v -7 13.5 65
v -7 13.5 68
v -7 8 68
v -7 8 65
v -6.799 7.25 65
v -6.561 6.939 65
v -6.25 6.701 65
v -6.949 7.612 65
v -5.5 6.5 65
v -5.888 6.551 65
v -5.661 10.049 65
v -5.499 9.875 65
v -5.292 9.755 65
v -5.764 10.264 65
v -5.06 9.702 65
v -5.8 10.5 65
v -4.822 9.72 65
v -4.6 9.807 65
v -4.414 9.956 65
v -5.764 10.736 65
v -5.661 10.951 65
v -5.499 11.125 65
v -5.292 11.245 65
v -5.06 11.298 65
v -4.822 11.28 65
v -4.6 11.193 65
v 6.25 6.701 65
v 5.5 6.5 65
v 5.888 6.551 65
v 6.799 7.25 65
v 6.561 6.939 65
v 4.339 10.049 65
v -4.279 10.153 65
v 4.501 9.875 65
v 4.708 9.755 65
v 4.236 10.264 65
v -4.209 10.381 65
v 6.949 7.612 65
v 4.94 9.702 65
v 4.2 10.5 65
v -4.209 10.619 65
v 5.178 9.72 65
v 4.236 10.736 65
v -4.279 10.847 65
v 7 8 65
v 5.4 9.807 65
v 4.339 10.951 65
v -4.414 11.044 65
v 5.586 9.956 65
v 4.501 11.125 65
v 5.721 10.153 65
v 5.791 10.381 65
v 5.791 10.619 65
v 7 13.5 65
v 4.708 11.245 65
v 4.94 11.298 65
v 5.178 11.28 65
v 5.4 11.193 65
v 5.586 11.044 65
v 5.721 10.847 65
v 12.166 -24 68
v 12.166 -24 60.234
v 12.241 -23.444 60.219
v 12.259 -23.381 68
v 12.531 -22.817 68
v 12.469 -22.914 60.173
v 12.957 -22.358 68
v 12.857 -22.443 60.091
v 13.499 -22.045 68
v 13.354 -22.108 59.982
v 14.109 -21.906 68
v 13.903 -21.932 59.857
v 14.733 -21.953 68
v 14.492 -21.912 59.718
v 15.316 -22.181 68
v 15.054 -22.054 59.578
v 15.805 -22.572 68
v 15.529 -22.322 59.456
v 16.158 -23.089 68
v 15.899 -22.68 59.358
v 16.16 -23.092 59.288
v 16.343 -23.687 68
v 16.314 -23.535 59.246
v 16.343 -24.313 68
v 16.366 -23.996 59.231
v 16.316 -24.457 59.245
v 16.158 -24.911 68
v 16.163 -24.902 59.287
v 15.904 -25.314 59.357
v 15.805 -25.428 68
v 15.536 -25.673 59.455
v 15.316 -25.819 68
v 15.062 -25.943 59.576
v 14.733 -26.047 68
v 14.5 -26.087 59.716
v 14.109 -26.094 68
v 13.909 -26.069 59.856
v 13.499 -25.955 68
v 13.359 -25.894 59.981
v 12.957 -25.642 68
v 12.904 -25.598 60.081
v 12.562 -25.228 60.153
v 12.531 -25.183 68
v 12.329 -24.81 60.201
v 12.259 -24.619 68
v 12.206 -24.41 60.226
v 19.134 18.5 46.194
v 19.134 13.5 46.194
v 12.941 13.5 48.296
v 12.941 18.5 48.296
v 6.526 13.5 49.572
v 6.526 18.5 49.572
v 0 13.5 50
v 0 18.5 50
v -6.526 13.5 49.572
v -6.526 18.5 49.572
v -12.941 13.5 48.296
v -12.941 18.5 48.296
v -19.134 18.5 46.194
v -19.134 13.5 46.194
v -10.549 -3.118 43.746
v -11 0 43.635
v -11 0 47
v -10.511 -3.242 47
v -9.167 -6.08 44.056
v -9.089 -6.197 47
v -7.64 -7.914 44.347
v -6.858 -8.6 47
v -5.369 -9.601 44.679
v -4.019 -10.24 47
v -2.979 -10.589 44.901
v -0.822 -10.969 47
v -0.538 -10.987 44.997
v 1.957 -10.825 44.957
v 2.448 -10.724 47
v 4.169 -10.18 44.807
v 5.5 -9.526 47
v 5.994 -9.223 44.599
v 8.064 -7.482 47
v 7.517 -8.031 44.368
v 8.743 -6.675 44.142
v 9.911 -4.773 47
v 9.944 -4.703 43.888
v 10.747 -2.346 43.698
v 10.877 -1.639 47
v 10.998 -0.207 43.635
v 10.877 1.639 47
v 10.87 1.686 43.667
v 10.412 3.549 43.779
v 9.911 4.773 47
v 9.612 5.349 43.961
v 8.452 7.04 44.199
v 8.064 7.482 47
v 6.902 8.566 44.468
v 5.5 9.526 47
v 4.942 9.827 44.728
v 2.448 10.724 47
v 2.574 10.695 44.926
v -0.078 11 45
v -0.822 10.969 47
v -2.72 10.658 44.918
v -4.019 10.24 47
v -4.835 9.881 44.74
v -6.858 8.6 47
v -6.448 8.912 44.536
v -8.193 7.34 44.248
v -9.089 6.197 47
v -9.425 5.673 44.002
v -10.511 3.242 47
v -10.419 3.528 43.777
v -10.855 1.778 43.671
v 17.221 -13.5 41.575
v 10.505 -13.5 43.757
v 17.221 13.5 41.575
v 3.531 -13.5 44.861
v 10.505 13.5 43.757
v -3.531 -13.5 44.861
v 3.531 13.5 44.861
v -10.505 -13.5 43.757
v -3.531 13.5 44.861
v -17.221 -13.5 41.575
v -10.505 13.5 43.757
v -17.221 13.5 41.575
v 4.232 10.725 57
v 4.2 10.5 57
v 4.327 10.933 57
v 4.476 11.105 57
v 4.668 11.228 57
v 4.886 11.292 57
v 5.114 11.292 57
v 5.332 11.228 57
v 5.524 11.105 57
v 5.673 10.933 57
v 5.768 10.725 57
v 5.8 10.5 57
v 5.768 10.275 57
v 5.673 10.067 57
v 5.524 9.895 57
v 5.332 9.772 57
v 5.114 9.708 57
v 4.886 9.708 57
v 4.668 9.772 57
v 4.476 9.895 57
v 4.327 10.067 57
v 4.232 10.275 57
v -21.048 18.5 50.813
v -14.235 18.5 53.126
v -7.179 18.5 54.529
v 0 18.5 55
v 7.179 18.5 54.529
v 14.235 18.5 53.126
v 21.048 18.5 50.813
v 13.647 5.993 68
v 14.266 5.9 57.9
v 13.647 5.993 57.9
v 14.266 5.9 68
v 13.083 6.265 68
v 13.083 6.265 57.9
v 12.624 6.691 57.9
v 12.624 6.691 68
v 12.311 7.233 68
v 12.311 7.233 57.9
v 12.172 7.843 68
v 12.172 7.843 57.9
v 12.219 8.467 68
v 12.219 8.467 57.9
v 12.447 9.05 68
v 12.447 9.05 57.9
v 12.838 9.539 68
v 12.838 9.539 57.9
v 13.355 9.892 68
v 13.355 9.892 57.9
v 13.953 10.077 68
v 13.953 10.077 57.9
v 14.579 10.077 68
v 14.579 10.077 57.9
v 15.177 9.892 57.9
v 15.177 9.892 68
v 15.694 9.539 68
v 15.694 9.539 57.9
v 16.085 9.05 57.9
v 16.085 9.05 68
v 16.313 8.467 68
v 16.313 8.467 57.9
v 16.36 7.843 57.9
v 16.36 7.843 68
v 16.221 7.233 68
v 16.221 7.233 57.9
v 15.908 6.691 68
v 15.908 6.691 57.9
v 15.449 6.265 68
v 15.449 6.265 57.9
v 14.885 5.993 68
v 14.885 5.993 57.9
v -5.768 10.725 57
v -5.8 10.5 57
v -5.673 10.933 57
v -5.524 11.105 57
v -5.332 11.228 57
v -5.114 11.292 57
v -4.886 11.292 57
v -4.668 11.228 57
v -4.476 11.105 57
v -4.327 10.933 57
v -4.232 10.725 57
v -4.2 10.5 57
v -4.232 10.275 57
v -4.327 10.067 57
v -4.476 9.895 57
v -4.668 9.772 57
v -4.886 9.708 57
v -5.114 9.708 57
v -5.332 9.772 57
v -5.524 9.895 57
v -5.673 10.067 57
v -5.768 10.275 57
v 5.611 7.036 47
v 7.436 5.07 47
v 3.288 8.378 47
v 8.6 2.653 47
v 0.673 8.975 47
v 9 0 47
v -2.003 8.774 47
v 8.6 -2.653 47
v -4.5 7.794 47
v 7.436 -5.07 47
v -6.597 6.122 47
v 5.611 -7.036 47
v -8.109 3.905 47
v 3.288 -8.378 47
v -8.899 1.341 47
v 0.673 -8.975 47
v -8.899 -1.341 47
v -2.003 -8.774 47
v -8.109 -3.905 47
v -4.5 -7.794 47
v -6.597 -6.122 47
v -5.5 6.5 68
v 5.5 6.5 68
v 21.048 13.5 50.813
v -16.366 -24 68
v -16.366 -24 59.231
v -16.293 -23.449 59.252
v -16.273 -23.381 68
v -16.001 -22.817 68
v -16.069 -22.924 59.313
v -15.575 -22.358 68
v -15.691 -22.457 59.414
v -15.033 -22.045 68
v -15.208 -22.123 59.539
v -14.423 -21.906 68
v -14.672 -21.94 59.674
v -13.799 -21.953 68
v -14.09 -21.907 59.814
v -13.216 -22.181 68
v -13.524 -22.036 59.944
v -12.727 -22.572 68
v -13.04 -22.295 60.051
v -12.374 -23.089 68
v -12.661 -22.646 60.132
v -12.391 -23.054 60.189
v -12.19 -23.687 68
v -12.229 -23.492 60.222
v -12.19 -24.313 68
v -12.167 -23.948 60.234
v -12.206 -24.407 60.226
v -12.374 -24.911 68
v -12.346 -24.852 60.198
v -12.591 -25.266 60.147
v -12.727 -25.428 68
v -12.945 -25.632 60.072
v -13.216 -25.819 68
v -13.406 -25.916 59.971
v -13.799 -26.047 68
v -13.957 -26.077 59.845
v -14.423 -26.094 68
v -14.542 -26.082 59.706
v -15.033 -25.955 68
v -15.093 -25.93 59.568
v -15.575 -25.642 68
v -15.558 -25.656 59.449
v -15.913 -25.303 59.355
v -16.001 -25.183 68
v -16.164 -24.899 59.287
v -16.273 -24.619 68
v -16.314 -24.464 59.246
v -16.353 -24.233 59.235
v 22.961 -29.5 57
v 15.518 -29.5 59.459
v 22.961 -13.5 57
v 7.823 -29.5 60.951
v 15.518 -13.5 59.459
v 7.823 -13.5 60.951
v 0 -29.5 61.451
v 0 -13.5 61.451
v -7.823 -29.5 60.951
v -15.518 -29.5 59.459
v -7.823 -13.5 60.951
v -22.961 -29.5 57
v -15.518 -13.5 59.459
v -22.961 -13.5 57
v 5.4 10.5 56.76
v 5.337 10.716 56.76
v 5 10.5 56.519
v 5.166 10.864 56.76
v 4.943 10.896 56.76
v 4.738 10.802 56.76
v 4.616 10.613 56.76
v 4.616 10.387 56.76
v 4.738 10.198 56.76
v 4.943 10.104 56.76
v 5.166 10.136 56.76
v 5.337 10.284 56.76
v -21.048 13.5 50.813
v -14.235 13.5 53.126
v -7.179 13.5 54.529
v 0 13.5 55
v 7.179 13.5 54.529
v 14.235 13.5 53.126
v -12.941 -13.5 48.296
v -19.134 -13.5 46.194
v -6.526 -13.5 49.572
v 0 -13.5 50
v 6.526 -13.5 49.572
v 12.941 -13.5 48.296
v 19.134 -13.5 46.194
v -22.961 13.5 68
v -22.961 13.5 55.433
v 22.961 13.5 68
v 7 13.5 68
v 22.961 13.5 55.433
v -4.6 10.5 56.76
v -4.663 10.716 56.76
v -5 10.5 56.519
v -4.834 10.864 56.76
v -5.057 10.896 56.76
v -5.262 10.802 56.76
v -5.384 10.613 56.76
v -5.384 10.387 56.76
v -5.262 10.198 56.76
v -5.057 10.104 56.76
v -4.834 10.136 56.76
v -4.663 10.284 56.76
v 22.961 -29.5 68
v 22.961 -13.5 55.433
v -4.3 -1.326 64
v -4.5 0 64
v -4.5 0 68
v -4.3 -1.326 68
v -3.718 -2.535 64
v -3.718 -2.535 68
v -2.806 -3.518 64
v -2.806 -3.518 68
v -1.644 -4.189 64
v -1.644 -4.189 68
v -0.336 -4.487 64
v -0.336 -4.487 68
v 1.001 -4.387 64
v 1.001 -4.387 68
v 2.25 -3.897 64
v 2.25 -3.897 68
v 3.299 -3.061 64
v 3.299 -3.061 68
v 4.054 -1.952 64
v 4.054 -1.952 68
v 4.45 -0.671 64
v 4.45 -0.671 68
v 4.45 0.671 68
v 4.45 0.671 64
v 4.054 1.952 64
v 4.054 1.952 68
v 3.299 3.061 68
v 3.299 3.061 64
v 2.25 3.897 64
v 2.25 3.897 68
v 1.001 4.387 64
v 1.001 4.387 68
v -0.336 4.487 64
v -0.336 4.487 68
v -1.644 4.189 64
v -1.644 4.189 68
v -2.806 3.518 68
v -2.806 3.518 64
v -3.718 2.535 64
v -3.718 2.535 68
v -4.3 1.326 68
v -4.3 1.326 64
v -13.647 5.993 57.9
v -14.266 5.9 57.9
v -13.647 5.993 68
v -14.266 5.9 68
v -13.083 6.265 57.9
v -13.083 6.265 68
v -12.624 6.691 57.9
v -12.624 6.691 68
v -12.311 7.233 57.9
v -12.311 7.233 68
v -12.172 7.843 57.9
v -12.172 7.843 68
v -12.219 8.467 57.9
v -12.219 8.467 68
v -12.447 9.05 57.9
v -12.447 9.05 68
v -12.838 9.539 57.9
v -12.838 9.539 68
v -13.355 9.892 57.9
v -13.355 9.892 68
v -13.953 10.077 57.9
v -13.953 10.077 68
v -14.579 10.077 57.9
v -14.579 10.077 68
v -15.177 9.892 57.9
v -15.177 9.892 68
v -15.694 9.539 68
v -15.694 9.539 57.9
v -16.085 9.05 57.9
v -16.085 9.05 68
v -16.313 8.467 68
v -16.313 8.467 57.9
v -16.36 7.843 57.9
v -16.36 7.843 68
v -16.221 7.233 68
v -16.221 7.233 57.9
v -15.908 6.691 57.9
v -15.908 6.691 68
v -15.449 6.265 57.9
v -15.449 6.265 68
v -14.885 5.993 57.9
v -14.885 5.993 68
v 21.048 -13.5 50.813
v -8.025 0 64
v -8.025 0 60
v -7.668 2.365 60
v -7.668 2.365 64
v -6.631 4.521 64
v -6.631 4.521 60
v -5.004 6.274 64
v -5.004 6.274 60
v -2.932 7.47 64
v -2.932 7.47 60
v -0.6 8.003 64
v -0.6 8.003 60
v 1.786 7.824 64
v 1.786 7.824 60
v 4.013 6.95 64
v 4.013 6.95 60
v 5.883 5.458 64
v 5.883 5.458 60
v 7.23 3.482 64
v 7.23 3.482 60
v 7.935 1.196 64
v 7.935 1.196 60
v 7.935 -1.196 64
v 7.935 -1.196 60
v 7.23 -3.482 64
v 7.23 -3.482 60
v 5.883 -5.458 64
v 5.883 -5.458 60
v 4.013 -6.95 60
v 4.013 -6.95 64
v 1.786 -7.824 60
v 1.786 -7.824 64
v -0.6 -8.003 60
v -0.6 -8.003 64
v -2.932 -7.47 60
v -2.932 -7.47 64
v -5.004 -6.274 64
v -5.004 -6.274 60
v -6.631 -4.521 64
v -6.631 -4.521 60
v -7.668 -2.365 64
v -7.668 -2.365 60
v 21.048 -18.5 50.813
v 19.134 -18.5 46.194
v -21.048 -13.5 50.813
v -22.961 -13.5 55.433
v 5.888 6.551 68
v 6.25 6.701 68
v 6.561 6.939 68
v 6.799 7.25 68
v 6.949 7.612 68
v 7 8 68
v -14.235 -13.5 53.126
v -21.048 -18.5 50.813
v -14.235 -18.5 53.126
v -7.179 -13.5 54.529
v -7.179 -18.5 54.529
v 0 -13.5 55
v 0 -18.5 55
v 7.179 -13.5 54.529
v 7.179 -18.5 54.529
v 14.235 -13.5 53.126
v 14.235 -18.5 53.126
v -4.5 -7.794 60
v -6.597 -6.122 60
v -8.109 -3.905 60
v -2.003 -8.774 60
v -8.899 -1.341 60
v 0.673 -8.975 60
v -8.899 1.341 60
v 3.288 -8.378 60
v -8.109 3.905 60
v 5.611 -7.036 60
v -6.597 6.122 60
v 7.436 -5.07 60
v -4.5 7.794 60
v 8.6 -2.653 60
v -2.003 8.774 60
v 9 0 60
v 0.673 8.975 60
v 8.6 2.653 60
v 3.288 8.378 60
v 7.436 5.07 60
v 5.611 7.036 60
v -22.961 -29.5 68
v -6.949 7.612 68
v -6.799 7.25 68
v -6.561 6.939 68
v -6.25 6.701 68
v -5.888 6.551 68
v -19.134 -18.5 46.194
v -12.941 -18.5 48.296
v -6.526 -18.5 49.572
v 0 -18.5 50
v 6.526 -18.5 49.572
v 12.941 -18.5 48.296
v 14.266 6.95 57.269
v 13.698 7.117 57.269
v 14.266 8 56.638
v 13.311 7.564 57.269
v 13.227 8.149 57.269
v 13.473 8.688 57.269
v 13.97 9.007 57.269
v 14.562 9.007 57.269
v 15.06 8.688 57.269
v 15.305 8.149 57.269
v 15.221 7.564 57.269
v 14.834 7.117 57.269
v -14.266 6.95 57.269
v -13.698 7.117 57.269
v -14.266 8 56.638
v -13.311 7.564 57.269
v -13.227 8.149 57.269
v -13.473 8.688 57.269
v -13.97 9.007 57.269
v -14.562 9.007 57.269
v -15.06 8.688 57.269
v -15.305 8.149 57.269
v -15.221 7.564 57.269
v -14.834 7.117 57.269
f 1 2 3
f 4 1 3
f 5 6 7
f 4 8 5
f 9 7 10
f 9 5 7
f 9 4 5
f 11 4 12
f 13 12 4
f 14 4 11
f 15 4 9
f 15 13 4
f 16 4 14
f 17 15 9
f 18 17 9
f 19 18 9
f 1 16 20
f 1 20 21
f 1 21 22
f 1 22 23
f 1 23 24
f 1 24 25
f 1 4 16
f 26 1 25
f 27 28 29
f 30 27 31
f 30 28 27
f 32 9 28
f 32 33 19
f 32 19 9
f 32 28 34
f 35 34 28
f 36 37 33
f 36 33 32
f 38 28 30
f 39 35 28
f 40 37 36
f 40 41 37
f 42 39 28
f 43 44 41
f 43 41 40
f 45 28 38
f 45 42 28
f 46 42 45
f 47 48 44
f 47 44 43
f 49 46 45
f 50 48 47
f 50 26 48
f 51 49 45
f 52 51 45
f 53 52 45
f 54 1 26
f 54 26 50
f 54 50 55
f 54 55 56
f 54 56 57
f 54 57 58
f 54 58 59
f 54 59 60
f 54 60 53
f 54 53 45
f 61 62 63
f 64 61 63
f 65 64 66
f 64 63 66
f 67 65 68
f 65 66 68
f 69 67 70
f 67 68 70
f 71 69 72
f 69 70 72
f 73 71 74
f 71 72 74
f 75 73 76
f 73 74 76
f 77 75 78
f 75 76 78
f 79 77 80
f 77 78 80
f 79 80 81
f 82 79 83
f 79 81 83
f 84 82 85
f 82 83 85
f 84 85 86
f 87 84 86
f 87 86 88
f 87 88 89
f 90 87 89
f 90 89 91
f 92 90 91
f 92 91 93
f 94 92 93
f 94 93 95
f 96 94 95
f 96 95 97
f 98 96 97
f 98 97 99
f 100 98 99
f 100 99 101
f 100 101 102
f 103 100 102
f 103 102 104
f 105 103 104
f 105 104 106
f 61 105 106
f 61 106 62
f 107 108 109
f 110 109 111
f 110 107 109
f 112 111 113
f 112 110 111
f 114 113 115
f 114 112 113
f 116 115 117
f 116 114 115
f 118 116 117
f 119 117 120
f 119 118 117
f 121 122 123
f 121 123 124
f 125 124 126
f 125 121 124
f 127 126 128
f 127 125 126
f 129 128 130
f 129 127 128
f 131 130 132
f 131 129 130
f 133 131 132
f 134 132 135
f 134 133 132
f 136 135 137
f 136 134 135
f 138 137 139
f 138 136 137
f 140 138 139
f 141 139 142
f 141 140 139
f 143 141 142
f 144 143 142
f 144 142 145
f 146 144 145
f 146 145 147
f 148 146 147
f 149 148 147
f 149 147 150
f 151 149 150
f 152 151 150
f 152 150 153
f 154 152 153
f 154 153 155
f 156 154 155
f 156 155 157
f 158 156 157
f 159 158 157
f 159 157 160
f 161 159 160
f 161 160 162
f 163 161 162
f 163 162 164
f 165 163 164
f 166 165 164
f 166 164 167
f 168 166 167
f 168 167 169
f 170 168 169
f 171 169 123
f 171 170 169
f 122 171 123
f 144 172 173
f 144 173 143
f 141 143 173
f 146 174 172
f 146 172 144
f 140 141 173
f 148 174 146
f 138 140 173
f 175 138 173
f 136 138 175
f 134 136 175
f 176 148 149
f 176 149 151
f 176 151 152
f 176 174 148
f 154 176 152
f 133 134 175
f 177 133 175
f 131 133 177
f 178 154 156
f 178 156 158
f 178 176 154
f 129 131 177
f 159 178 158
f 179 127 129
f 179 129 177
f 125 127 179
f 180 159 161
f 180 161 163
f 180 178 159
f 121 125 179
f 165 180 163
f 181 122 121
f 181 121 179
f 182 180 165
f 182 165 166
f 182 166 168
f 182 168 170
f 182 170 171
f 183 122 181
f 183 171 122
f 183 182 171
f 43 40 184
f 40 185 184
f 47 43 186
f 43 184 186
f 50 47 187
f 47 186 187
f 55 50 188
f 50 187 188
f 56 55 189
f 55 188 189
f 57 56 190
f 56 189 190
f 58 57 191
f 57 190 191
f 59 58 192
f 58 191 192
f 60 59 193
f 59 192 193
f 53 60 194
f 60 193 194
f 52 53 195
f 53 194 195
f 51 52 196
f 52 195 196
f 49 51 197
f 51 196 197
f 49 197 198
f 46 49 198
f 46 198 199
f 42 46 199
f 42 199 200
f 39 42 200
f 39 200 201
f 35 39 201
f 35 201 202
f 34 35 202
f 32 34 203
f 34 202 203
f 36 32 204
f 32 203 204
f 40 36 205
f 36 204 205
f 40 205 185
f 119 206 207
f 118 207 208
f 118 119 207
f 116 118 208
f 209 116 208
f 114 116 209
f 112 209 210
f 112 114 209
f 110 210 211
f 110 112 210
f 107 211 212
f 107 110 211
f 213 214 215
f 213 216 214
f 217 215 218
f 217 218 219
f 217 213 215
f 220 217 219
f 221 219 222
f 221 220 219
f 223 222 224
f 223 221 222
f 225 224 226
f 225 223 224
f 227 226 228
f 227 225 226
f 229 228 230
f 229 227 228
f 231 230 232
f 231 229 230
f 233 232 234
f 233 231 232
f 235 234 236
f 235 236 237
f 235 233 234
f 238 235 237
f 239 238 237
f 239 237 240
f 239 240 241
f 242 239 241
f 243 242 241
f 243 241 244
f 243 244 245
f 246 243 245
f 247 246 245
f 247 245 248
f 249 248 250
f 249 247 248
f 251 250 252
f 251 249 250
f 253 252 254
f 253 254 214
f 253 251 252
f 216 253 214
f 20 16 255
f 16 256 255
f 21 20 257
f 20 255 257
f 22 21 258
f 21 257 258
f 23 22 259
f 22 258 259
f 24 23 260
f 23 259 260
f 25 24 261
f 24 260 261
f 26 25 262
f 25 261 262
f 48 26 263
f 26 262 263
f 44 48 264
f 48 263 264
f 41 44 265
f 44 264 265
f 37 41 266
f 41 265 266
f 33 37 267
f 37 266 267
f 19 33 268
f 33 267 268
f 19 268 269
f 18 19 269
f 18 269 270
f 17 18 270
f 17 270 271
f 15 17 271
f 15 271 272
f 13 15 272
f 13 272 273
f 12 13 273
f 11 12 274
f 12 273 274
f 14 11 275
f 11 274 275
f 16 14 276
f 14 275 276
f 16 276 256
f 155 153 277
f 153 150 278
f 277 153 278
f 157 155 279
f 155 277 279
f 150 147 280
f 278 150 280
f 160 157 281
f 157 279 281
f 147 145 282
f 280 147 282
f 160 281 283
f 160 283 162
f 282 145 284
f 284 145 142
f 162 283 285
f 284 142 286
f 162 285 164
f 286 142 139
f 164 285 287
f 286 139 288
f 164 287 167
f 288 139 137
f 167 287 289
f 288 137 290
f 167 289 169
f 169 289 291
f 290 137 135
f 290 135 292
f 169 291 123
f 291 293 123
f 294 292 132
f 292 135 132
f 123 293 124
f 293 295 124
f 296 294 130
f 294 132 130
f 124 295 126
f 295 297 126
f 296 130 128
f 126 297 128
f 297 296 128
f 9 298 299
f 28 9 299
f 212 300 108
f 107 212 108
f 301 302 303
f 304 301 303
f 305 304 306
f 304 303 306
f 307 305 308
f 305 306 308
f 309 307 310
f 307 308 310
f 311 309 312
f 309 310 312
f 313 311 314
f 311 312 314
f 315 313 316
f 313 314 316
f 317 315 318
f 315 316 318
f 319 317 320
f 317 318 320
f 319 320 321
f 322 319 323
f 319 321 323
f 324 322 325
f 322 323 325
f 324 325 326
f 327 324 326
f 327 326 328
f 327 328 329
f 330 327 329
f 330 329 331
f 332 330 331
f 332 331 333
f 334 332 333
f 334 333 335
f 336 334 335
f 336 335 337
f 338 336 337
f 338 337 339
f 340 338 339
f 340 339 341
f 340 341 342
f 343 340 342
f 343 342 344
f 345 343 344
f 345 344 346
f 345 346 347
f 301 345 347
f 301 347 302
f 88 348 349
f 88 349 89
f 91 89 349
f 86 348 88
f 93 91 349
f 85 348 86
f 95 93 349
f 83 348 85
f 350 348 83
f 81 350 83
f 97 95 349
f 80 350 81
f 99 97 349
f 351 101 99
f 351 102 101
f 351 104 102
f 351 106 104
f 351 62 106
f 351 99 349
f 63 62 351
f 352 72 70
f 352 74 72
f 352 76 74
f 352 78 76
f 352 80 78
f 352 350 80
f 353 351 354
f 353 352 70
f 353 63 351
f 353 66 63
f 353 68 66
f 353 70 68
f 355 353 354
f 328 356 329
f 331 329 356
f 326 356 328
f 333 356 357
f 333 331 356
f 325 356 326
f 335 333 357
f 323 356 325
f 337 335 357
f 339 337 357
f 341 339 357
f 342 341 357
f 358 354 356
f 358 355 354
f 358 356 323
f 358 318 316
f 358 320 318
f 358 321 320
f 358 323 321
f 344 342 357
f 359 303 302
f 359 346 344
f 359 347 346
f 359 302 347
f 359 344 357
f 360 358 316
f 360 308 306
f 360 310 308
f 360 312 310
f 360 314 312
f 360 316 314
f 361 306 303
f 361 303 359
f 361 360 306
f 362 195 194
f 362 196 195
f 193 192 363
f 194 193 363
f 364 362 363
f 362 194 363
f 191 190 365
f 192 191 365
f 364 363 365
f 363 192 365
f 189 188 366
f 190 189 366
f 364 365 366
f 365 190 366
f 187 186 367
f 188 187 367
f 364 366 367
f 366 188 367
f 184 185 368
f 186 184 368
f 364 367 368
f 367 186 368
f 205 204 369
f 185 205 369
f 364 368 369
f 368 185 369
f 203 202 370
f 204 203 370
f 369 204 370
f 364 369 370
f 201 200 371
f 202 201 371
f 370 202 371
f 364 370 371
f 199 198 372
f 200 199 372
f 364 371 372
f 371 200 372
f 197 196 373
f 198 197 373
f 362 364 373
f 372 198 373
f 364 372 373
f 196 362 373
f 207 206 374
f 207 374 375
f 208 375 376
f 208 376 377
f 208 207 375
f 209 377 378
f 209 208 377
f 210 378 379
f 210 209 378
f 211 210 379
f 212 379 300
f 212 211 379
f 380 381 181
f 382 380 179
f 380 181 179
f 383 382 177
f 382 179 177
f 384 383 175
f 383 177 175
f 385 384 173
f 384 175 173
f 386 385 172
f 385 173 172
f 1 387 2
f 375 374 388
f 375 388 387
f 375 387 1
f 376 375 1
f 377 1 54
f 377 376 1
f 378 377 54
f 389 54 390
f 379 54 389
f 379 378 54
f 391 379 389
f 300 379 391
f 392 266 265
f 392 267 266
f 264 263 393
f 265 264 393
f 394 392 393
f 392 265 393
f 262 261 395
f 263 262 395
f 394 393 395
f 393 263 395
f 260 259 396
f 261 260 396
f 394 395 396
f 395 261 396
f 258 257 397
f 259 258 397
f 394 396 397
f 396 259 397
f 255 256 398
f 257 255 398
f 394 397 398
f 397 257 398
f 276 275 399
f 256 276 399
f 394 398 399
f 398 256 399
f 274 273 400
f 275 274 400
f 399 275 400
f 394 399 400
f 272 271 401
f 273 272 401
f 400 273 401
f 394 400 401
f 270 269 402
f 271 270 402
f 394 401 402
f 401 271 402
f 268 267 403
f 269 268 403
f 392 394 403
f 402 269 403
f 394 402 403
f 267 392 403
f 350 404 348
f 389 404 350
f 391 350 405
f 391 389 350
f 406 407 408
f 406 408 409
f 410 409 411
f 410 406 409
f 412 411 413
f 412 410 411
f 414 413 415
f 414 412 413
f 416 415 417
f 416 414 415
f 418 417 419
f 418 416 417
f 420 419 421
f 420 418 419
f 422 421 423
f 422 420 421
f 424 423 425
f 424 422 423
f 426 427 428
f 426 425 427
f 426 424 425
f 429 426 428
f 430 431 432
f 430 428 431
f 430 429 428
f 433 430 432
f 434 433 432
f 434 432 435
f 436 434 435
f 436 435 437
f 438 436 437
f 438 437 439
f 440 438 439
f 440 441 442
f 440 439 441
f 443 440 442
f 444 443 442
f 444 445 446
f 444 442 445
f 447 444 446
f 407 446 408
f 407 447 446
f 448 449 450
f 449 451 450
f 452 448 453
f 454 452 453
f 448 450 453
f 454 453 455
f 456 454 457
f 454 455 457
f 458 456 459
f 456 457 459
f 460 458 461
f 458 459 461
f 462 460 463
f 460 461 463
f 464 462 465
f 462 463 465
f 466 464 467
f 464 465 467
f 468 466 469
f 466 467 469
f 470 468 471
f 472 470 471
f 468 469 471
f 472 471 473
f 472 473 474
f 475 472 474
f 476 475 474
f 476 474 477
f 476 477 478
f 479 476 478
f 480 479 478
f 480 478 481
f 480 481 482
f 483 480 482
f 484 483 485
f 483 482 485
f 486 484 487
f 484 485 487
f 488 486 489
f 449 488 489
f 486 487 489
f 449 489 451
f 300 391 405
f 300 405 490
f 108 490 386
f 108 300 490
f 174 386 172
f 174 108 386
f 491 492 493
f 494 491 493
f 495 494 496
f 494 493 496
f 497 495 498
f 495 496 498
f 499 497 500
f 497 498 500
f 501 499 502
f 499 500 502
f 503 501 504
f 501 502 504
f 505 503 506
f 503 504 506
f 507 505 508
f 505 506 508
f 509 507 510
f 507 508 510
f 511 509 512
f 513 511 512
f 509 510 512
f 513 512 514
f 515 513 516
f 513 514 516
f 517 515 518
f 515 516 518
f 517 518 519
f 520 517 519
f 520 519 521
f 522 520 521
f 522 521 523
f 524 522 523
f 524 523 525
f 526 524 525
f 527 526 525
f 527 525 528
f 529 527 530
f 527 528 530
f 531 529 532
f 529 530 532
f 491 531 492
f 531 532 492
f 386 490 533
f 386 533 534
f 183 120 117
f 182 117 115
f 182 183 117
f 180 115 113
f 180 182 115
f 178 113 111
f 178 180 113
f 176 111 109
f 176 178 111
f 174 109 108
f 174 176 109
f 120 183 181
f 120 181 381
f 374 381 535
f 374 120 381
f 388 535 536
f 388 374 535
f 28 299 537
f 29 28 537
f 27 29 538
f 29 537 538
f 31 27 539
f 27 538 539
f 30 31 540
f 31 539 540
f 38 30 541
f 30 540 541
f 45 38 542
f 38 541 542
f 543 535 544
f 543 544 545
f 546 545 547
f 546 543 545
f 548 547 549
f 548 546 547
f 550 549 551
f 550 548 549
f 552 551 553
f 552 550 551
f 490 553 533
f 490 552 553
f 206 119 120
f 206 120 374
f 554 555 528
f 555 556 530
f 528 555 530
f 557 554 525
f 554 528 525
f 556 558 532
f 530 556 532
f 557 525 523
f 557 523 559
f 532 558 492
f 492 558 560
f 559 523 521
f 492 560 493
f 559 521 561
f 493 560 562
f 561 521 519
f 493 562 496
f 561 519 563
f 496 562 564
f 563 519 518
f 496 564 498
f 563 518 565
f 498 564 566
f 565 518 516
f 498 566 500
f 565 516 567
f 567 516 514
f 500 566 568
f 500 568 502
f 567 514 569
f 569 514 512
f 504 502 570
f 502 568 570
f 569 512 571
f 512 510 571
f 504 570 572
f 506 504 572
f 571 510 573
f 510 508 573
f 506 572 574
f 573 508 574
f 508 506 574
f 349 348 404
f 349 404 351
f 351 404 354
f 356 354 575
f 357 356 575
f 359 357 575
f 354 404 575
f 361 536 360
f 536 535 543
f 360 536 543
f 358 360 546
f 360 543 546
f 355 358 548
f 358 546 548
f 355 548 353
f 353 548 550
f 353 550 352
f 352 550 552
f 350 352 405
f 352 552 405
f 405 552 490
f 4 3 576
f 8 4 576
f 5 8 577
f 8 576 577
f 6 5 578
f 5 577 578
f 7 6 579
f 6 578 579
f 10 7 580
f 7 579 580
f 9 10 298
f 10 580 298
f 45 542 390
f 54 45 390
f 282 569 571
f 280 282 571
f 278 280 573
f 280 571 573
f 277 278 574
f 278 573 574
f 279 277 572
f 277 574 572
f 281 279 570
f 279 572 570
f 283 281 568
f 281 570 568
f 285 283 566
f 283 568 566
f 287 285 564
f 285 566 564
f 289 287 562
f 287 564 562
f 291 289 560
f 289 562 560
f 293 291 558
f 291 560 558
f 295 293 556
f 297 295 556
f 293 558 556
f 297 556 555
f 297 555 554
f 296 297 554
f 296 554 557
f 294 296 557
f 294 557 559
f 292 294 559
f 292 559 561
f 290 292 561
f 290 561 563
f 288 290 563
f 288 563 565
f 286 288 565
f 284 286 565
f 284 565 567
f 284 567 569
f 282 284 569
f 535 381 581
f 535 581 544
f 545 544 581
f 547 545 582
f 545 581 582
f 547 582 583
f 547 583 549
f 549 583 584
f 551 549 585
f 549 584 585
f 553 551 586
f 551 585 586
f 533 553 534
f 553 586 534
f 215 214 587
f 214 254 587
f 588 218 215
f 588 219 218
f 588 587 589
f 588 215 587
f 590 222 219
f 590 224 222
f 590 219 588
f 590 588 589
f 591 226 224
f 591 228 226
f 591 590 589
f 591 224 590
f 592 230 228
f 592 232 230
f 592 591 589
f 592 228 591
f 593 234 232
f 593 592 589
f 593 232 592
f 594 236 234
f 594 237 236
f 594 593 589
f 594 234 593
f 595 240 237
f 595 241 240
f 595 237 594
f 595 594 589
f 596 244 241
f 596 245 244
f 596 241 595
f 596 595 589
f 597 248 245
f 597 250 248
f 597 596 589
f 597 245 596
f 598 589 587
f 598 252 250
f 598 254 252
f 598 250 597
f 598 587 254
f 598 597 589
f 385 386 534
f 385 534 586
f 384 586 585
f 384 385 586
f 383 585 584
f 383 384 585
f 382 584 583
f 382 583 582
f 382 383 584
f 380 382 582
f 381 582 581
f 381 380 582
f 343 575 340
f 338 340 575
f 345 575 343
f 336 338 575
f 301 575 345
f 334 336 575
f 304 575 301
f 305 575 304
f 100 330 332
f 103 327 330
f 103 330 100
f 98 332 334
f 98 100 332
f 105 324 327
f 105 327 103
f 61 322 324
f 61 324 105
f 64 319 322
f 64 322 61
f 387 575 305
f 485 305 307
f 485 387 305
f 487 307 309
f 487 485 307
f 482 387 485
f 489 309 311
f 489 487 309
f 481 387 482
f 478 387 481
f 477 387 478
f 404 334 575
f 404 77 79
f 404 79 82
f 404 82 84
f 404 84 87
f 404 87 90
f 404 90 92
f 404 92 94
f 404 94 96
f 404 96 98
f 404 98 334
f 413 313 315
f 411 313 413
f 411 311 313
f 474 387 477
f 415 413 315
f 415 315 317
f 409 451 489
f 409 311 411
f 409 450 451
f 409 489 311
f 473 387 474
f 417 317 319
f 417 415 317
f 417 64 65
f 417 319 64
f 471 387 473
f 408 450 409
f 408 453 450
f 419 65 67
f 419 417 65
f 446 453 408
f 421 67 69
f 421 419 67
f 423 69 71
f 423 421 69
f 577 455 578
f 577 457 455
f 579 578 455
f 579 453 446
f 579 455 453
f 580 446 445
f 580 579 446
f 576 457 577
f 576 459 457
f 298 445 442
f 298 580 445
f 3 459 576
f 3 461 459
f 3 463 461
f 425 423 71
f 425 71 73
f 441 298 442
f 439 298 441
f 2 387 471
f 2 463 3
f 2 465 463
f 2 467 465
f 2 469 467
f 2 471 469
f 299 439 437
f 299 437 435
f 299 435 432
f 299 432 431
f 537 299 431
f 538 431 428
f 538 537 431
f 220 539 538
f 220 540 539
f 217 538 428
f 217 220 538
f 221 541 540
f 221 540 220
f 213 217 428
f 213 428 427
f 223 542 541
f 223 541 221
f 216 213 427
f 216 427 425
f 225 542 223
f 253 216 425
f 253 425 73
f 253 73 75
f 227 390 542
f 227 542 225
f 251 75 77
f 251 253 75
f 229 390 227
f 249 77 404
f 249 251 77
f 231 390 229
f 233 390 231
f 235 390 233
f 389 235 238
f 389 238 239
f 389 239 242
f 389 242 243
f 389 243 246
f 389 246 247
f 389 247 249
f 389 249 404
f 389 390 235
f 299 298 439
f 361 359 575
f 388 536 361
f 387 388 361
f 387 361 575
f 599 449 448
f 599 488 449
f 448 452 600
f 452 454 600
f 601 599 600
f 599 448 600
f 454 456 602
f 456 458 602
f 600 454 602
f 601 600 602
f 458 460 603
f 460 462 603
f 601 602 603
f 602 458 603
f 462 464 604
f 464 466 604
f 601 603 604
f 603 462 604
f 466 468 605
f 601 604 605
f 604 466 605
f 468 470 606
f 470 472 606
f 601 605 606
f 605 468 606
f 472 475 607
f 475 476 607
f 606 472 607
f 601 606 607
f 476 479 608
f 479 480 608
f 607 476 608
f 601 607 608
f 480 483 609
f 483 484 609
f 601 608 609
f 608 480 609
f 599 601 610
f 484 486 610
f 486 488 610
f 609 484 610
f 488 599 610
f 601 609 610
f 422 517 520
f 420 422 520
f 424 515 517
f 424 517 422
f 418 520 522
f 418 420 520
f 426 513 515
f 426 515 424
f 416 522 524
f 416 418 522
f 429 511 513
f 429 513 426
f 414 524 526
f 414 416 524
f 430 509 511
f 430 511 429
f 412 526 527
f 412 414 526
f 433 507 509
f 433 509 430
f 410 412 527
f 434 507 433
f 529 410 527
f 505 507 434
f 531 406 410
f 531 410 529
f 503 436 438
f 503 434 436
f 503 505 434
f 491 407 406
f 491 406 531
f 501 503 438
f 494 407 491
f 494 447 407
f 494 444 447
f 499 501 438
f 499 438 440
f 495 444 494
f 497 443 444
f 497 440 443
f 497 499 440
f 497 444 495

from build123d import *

# Parameters (mm, degrees)
BOSS_EXTRUDE1_DEPTH      = 13.5
BOSS_EXTRUDE2_DEPTH      = 18.5
BOSS_EXTRUDE3_DEPTH      = 5
SKETCH4_W                = 45.922011884
SKETCH4_H                = 20
BOSS_EXTRUDE4_DEPTH      = 13.5
SKETCH2_R                = 4
CUT_EXTRUDE1_DEPTH       = 268.629329099
SKETCH5_R                = 8
CUT_EXTRUDE2_DEPTH       = 4
SKETCH6_R                = 9
CUT_EXTRUDE3_DEPTH       = 12
SKETCH7_R                = 12.5
CUT_EXTRUDE4_DEPTH       = 5
BOSS_EXTRUDE5_DEPTH      = 13.5
CUT_EXTRUDE5_REACH       = 210.1
CUT_EXTRUDE5_END_RADIUS  = 45
SKETCH8_R                = 9
CUT_EXTRUDE6_REACH       = 210.1
SKETCH10_R               = 4.5
SKETCH18_R               = 11
CUT_EXTRUDE9_DEPTH       = 47
CUT_EXTRUDE10_DEPTH      = 268.629329099
CUT_EXTRUDE10_DEPTH_BACK = 268.629329099
SKETCH19_W               = 45.922011884
SKETCH19_H               = 198
SKETCH30_R               = 8.025
CUT_EXTRUDE13_DEPTH      = 4
BOSS_EXTRUDE9_DEPTH      = 16
M5_TAPPED_HOLE2_D        = 4.2
CUT_EXTRUDE17_DEPTH      = 3
M2_TAPPED_HOLE1_D        = 1.6
M2_TAPPED_HOLE1_DEPTH    = 8
M2_TAPPED_HOLE1_TIP      = 0.480688495


with BuildPart() as part:
    # Sketch1 → Boss-Extrude1 (new, symmetric)
    with BuildSketch(Plane(origin=(0, 0, 0), x_dir=(1, 0, 0), z_dir=(0, 1, 0))):
        with BuildLine():
            ThreePointArc((17.220754456, -41.574578963), (0, -45), (-17.220754456, -41.574578963))
            Line((-17.220754456, -41.574578963), (-22.961005942, -55.432771951))
            ThreePointArc((-22.961005942, -55.432771951), (0, -60), (22.961005942, -55.432771951))
            Line((22.961005942, -55.432771951), (17.220754456, -41.574578963))
        make_face()
    extrude(amount=BOSS_EXTRUDE1_DEPTH, both=True)

    # Sketch1_3 → Boss-Extrude2 (add, symmetric)
    with BuildSketch(Plane(origin=(0, 0, 0), x_dir=(1, 0, 0), z_dir=(0, 1, 0))):
        with BuildLine():
            ThreePointArc((19.134171618, -46.193976626), (0, -50), (-19.134171618, -46.193976626))
            Line((-19.134171618, -46.193976626), (-21.04758878, -50.813374288))
            ThreePointArc((-21.04758878, -50.813374288), (0, -55), (21.04758878, -50.813374288))
            Line((21.04758878, -50.813374288), (19.134171618, -46.193976626))
        make_face()
    extrude(amount=BOSS_EXTRUDE2_DEPTH, both=True)

    # Sketch3 → Boss-Extrude3 (add, symmetric)
    with BuildSketch(Plane.XZ):
        with BuildLine():
            Line((-22.961005942, 266), (-22.961005942, 55.432771951))
            ThreePointArc((-22.961005942, 55.432771951), (-20.481139434, 56.39612511), (-17.961005942, 57.248600555))
            Line((-17.961005942, 57.248600555), (-17.961005942, 246))
            Line((-17.961005942, 246), (17.961005942, 246))
            Line((17.961005942, 246), (17.961005942, 57.248600555))
            ThreePointArc((17.961005942, 57.248600555), (20.481139434, 56.39612511), (22.961005942, 55.432771951))
            Line((22.961005942, 55.432771951), (22.961005942, 266))
            Line((22.961005942, 266), (-22.961005942, 266))
        make_face()
    extrude(amount=BOSS_EXTRUDE3_DEPTH, both=True)

    # Sketch4 → Boss-Extrude4 (add, symmetric)
    with BuildSketch(Plane(origin=(0, 0, 0), x_dir=(1, 0, 0), z_dir=(0, 1, 0))):
        with Locations((0, -256)):
            Rectangle(SKETCH4_W, SKETCH4_H)
    extrude(amount=BOSS_EXTRUDE4_DEPTH, both=True)

    # Sketch2 → Cut-Extrude1 (cut, through all)
    with BuildSketch(Plane.XY):
        with Locations(Location((0, 0, 0), (0, 0, 180))):
            Circle(SKETCH2_R)
    extrude(amount=CUT_EXTRUDE1_DEPTH, mode=Mode.SUBTRACT)

    # Sketch5 → Cut-Extrude2 (cut)
    with BuildSketch(Plane(origin=(0, 0, 246), x_dir=(-1, 0, 0), z_dir=(0, 0, -1))):
        Circle(SKETCH5_R)
    extrude(amount=-CUT_EXTRUDE2_DEPTH, mode=Mode.SUBTRACT)

    # Sketch6 → Cut-Extrude3 (cut)
    with BuildSketch(Plane.XY.offset(266)):
        Circle(SKETCH6_R)
    extrude(amount=-CUT_EXTRUDE3_DEPTH, mode=Mode.SUBTRACT)

    # Sketch7 → Cut-Extrude4 (cut)
    with BuildSketch(Plane.XY.offset(266)):
        Circle(SKETCH7_R)
    extrude(amount=-CUT_EXTRUDE4_DEPTH, mode=Mode.SUBTRACT)

    # Sketch9 → Boss-Extrude5 (add, symmetric)
    with BuildSketch(Plane(origin=(0, 0, 0), x_dir=(1, 0, 0), z_dir=(0, 1, 0))):
        with BuildLine():
            Line((-22.961005942, -55.432771951), (-22.961005942, -68))
            Line((-22.961005942, -68), (22.961005942, -68))
            Line((22.961005942, -68), (22.961005942, -55.432771951))
            ThreePointArc((22.961005942, -55.432771951), (0, -60), (-22.961005942, -55.432771951))
        make_face()
    extrude(amount=BOSS_EXTRUDE5_DEPTH, both=True)

    # Cut-Extrude5: up to this cylinder (the profile starts outside it)
    cut_extrude5_end = Plane(origin=(0, 0, 0), z_dir=(0, -1, 0)) * Cylinder(CUT_EXTRUDE5_END_RADIUS, 511.2, mode=Mode.PRIVATE)
    # Sketch8 → Cut-Extrude5 (cut, up to the surface)
    with BuildSketch(Plane.XY.offset(60), mode=Mode.PRIVATE) as cut_extrude5_sk1:
        Circle(SKETCH8_R)
    cut_extrude5_tool1 = extrude(cut_extrude5_sk1.sketch, amount=-CUT_EXTRUDE5_REACH, mode=Mode.PRIVATE) - cut_extrude5_end
    add(cut_extrude5_tool1.solids().sort_by_distance((0, 0, 60))[0], mode=Mode.SUBTRACT)

    # Sketch10 → Cut-Extrude6 (cut, up to next)
    with BuildSketch(Plane.XY.offset(60), mode=Mode.PRIVATE) as cut_extrude6_sk1:
        with Locations(Location((0, 0, 0), (0, 0, 180))):
            Circle(SKETCH10_R)
    cut_extrude6_tool1 = extrude(cut_extrude6_sk1.sketch, amount=CUT_EXTRUDE6_REACH, mode=Mode.PRIVATE) & part.part
    add(cut_extrude6_tool1.solids().sort_by_distance((0, 0, 60))[0], mode=Mode.SUBTRACT)

    # Sketch18 → Cut-Extrude9 (cut)
    with BuildSketch(Plane.XY):
        with Locations(Location((0, 0, 0), (0, 0, 180))):
            Circle(SKETCH18_R)
    extrude(amount=CUT_EXTRUDE9_DEPTH, mode=Mode.SUBTRACT)

    # Sketch19 → Cut-Extrude10 (cut, two sides: drawn at the far end of the back side and taken through both)
    with BuildSketch(Plane(origin=(0, 0, 0), x_dir=(1, 0, 0), z_dir=(0, 1, 0)).offset(-CUT_EXTRUDE10_DEPTH_BACK)):
        with Locations((0, -167)):
            Rectangle(SKETCH19_W, SKETCH19_H)
    extrude(amount=CUT_EXTRUDE10_DEPTH + CUT_EXTRUDE10_DEPTH_BACK, mode=Mode.SUBTRACT)

    # Sketch23 → M5 Tapped Hole1 (revolve, cut)
    with BuildSketch(Plane(origin=(14.26606865, 8, 68), x_dir=(0, -1, 0), z_dir=(1, 0, 0))):
        Polygon((0, 0), (0, 11.3618073), (2.1, 10.1), (2.1, 0), align=None)
    m5_tapped_hole1 = revolve(axis=Axis((14.26606865, 8, 74.35), (0, 0, -1)), mode=Mode.SUBTRACT)

    # Mirror1: M5 Tapped Hole1 across plane
    add(m5_tapped_hole1.mirror(Plane(origin=(0, 0, 0), x_dir=(0, 0, 1), z_dir=(1, 0, 0))), mode=Mode.SUBTRACT)

    # Sketch30 → Cut-Extrude13 (cut)
    with BuildSketch(Plane(origin=(0, 0, 60), x_dir=(-1, 0, 0), z_dir=(0, 0, -1))):
        Circle(SKETCH30_R)
    extrude(amount=-CUT_EXTRUDE13_DEPTH, mode=Mode.SUBTRACT)

    # Sketch37 → Boss-Extrude9 (add)
    with BuildSketch(Plane.XZ.offset(13.5)):
        with BuildLine():
            Line((-22.961005942, 68), (22.961005942, 68))
            Line((22.961005942, 68), (22.961005942, 57))
            ThreePointArc((22.961005942, 57), (0, 61.450856738), (-22.961005942, 57))
            Line((-22.961005942, 57), (-22.961005942, 68))
        make_face()
    extrude(amount=BOSS_EXTRUDE9_DEPTH)

    # M5 Tapped Hole2 (through all)
    with Locations(Plane.XY.offset(68)):
        with Locations((-14.26606865, -24), (14.26606865, -24)):
            Hole(M5_TAPPED_HOLE2_D / 2)

    # Sketch40 → Cut-Extrude17 (cut)
    with BuildSketch(Plane.XY.offset(68)):
        with BuildLine():
            Line((-7, 13.5), (-7, 8))
            ThreePointArc((-7, 8), (-6.560660172, 6.939339828), (-5.5, 6.5))
            Line((-5.5, 6.5), (5.5, 6.5))
            ThreePointArc((5.5, 6.5), (6.560660172, 6.939339828), (7, 8))
            Line((7, 8), (7, 13.5))
            Line((7, 13.5), (-7, 13.5))
        make_face()
    extrude(amount=-CUT_EXTRUDE17_DEPTH, mode=Mode.SUBTRACT)

    # M2 Tapped Hole1
    with Locations(Plane.XY.offset(65)):
        with Locations((5, 10.5), (-5, 10.5)):
            Hole(M2_TAPPED_HOLE1_D / 2, depth=M2_TAPPED_HOLE1_DEPTH)
            with Locations((0, 0, -(M2_TAPPED_HOLE1_DEPTH + M2_TAPPED_HOLE1_TIP / 2))):  # 118° drill point
                Cone(0, M2_TAPPED_HOLE1_D / 2, M2_TAPPED_HOLE1_TIP, mode=Mode.SUBTRACT)


solid = part.part
